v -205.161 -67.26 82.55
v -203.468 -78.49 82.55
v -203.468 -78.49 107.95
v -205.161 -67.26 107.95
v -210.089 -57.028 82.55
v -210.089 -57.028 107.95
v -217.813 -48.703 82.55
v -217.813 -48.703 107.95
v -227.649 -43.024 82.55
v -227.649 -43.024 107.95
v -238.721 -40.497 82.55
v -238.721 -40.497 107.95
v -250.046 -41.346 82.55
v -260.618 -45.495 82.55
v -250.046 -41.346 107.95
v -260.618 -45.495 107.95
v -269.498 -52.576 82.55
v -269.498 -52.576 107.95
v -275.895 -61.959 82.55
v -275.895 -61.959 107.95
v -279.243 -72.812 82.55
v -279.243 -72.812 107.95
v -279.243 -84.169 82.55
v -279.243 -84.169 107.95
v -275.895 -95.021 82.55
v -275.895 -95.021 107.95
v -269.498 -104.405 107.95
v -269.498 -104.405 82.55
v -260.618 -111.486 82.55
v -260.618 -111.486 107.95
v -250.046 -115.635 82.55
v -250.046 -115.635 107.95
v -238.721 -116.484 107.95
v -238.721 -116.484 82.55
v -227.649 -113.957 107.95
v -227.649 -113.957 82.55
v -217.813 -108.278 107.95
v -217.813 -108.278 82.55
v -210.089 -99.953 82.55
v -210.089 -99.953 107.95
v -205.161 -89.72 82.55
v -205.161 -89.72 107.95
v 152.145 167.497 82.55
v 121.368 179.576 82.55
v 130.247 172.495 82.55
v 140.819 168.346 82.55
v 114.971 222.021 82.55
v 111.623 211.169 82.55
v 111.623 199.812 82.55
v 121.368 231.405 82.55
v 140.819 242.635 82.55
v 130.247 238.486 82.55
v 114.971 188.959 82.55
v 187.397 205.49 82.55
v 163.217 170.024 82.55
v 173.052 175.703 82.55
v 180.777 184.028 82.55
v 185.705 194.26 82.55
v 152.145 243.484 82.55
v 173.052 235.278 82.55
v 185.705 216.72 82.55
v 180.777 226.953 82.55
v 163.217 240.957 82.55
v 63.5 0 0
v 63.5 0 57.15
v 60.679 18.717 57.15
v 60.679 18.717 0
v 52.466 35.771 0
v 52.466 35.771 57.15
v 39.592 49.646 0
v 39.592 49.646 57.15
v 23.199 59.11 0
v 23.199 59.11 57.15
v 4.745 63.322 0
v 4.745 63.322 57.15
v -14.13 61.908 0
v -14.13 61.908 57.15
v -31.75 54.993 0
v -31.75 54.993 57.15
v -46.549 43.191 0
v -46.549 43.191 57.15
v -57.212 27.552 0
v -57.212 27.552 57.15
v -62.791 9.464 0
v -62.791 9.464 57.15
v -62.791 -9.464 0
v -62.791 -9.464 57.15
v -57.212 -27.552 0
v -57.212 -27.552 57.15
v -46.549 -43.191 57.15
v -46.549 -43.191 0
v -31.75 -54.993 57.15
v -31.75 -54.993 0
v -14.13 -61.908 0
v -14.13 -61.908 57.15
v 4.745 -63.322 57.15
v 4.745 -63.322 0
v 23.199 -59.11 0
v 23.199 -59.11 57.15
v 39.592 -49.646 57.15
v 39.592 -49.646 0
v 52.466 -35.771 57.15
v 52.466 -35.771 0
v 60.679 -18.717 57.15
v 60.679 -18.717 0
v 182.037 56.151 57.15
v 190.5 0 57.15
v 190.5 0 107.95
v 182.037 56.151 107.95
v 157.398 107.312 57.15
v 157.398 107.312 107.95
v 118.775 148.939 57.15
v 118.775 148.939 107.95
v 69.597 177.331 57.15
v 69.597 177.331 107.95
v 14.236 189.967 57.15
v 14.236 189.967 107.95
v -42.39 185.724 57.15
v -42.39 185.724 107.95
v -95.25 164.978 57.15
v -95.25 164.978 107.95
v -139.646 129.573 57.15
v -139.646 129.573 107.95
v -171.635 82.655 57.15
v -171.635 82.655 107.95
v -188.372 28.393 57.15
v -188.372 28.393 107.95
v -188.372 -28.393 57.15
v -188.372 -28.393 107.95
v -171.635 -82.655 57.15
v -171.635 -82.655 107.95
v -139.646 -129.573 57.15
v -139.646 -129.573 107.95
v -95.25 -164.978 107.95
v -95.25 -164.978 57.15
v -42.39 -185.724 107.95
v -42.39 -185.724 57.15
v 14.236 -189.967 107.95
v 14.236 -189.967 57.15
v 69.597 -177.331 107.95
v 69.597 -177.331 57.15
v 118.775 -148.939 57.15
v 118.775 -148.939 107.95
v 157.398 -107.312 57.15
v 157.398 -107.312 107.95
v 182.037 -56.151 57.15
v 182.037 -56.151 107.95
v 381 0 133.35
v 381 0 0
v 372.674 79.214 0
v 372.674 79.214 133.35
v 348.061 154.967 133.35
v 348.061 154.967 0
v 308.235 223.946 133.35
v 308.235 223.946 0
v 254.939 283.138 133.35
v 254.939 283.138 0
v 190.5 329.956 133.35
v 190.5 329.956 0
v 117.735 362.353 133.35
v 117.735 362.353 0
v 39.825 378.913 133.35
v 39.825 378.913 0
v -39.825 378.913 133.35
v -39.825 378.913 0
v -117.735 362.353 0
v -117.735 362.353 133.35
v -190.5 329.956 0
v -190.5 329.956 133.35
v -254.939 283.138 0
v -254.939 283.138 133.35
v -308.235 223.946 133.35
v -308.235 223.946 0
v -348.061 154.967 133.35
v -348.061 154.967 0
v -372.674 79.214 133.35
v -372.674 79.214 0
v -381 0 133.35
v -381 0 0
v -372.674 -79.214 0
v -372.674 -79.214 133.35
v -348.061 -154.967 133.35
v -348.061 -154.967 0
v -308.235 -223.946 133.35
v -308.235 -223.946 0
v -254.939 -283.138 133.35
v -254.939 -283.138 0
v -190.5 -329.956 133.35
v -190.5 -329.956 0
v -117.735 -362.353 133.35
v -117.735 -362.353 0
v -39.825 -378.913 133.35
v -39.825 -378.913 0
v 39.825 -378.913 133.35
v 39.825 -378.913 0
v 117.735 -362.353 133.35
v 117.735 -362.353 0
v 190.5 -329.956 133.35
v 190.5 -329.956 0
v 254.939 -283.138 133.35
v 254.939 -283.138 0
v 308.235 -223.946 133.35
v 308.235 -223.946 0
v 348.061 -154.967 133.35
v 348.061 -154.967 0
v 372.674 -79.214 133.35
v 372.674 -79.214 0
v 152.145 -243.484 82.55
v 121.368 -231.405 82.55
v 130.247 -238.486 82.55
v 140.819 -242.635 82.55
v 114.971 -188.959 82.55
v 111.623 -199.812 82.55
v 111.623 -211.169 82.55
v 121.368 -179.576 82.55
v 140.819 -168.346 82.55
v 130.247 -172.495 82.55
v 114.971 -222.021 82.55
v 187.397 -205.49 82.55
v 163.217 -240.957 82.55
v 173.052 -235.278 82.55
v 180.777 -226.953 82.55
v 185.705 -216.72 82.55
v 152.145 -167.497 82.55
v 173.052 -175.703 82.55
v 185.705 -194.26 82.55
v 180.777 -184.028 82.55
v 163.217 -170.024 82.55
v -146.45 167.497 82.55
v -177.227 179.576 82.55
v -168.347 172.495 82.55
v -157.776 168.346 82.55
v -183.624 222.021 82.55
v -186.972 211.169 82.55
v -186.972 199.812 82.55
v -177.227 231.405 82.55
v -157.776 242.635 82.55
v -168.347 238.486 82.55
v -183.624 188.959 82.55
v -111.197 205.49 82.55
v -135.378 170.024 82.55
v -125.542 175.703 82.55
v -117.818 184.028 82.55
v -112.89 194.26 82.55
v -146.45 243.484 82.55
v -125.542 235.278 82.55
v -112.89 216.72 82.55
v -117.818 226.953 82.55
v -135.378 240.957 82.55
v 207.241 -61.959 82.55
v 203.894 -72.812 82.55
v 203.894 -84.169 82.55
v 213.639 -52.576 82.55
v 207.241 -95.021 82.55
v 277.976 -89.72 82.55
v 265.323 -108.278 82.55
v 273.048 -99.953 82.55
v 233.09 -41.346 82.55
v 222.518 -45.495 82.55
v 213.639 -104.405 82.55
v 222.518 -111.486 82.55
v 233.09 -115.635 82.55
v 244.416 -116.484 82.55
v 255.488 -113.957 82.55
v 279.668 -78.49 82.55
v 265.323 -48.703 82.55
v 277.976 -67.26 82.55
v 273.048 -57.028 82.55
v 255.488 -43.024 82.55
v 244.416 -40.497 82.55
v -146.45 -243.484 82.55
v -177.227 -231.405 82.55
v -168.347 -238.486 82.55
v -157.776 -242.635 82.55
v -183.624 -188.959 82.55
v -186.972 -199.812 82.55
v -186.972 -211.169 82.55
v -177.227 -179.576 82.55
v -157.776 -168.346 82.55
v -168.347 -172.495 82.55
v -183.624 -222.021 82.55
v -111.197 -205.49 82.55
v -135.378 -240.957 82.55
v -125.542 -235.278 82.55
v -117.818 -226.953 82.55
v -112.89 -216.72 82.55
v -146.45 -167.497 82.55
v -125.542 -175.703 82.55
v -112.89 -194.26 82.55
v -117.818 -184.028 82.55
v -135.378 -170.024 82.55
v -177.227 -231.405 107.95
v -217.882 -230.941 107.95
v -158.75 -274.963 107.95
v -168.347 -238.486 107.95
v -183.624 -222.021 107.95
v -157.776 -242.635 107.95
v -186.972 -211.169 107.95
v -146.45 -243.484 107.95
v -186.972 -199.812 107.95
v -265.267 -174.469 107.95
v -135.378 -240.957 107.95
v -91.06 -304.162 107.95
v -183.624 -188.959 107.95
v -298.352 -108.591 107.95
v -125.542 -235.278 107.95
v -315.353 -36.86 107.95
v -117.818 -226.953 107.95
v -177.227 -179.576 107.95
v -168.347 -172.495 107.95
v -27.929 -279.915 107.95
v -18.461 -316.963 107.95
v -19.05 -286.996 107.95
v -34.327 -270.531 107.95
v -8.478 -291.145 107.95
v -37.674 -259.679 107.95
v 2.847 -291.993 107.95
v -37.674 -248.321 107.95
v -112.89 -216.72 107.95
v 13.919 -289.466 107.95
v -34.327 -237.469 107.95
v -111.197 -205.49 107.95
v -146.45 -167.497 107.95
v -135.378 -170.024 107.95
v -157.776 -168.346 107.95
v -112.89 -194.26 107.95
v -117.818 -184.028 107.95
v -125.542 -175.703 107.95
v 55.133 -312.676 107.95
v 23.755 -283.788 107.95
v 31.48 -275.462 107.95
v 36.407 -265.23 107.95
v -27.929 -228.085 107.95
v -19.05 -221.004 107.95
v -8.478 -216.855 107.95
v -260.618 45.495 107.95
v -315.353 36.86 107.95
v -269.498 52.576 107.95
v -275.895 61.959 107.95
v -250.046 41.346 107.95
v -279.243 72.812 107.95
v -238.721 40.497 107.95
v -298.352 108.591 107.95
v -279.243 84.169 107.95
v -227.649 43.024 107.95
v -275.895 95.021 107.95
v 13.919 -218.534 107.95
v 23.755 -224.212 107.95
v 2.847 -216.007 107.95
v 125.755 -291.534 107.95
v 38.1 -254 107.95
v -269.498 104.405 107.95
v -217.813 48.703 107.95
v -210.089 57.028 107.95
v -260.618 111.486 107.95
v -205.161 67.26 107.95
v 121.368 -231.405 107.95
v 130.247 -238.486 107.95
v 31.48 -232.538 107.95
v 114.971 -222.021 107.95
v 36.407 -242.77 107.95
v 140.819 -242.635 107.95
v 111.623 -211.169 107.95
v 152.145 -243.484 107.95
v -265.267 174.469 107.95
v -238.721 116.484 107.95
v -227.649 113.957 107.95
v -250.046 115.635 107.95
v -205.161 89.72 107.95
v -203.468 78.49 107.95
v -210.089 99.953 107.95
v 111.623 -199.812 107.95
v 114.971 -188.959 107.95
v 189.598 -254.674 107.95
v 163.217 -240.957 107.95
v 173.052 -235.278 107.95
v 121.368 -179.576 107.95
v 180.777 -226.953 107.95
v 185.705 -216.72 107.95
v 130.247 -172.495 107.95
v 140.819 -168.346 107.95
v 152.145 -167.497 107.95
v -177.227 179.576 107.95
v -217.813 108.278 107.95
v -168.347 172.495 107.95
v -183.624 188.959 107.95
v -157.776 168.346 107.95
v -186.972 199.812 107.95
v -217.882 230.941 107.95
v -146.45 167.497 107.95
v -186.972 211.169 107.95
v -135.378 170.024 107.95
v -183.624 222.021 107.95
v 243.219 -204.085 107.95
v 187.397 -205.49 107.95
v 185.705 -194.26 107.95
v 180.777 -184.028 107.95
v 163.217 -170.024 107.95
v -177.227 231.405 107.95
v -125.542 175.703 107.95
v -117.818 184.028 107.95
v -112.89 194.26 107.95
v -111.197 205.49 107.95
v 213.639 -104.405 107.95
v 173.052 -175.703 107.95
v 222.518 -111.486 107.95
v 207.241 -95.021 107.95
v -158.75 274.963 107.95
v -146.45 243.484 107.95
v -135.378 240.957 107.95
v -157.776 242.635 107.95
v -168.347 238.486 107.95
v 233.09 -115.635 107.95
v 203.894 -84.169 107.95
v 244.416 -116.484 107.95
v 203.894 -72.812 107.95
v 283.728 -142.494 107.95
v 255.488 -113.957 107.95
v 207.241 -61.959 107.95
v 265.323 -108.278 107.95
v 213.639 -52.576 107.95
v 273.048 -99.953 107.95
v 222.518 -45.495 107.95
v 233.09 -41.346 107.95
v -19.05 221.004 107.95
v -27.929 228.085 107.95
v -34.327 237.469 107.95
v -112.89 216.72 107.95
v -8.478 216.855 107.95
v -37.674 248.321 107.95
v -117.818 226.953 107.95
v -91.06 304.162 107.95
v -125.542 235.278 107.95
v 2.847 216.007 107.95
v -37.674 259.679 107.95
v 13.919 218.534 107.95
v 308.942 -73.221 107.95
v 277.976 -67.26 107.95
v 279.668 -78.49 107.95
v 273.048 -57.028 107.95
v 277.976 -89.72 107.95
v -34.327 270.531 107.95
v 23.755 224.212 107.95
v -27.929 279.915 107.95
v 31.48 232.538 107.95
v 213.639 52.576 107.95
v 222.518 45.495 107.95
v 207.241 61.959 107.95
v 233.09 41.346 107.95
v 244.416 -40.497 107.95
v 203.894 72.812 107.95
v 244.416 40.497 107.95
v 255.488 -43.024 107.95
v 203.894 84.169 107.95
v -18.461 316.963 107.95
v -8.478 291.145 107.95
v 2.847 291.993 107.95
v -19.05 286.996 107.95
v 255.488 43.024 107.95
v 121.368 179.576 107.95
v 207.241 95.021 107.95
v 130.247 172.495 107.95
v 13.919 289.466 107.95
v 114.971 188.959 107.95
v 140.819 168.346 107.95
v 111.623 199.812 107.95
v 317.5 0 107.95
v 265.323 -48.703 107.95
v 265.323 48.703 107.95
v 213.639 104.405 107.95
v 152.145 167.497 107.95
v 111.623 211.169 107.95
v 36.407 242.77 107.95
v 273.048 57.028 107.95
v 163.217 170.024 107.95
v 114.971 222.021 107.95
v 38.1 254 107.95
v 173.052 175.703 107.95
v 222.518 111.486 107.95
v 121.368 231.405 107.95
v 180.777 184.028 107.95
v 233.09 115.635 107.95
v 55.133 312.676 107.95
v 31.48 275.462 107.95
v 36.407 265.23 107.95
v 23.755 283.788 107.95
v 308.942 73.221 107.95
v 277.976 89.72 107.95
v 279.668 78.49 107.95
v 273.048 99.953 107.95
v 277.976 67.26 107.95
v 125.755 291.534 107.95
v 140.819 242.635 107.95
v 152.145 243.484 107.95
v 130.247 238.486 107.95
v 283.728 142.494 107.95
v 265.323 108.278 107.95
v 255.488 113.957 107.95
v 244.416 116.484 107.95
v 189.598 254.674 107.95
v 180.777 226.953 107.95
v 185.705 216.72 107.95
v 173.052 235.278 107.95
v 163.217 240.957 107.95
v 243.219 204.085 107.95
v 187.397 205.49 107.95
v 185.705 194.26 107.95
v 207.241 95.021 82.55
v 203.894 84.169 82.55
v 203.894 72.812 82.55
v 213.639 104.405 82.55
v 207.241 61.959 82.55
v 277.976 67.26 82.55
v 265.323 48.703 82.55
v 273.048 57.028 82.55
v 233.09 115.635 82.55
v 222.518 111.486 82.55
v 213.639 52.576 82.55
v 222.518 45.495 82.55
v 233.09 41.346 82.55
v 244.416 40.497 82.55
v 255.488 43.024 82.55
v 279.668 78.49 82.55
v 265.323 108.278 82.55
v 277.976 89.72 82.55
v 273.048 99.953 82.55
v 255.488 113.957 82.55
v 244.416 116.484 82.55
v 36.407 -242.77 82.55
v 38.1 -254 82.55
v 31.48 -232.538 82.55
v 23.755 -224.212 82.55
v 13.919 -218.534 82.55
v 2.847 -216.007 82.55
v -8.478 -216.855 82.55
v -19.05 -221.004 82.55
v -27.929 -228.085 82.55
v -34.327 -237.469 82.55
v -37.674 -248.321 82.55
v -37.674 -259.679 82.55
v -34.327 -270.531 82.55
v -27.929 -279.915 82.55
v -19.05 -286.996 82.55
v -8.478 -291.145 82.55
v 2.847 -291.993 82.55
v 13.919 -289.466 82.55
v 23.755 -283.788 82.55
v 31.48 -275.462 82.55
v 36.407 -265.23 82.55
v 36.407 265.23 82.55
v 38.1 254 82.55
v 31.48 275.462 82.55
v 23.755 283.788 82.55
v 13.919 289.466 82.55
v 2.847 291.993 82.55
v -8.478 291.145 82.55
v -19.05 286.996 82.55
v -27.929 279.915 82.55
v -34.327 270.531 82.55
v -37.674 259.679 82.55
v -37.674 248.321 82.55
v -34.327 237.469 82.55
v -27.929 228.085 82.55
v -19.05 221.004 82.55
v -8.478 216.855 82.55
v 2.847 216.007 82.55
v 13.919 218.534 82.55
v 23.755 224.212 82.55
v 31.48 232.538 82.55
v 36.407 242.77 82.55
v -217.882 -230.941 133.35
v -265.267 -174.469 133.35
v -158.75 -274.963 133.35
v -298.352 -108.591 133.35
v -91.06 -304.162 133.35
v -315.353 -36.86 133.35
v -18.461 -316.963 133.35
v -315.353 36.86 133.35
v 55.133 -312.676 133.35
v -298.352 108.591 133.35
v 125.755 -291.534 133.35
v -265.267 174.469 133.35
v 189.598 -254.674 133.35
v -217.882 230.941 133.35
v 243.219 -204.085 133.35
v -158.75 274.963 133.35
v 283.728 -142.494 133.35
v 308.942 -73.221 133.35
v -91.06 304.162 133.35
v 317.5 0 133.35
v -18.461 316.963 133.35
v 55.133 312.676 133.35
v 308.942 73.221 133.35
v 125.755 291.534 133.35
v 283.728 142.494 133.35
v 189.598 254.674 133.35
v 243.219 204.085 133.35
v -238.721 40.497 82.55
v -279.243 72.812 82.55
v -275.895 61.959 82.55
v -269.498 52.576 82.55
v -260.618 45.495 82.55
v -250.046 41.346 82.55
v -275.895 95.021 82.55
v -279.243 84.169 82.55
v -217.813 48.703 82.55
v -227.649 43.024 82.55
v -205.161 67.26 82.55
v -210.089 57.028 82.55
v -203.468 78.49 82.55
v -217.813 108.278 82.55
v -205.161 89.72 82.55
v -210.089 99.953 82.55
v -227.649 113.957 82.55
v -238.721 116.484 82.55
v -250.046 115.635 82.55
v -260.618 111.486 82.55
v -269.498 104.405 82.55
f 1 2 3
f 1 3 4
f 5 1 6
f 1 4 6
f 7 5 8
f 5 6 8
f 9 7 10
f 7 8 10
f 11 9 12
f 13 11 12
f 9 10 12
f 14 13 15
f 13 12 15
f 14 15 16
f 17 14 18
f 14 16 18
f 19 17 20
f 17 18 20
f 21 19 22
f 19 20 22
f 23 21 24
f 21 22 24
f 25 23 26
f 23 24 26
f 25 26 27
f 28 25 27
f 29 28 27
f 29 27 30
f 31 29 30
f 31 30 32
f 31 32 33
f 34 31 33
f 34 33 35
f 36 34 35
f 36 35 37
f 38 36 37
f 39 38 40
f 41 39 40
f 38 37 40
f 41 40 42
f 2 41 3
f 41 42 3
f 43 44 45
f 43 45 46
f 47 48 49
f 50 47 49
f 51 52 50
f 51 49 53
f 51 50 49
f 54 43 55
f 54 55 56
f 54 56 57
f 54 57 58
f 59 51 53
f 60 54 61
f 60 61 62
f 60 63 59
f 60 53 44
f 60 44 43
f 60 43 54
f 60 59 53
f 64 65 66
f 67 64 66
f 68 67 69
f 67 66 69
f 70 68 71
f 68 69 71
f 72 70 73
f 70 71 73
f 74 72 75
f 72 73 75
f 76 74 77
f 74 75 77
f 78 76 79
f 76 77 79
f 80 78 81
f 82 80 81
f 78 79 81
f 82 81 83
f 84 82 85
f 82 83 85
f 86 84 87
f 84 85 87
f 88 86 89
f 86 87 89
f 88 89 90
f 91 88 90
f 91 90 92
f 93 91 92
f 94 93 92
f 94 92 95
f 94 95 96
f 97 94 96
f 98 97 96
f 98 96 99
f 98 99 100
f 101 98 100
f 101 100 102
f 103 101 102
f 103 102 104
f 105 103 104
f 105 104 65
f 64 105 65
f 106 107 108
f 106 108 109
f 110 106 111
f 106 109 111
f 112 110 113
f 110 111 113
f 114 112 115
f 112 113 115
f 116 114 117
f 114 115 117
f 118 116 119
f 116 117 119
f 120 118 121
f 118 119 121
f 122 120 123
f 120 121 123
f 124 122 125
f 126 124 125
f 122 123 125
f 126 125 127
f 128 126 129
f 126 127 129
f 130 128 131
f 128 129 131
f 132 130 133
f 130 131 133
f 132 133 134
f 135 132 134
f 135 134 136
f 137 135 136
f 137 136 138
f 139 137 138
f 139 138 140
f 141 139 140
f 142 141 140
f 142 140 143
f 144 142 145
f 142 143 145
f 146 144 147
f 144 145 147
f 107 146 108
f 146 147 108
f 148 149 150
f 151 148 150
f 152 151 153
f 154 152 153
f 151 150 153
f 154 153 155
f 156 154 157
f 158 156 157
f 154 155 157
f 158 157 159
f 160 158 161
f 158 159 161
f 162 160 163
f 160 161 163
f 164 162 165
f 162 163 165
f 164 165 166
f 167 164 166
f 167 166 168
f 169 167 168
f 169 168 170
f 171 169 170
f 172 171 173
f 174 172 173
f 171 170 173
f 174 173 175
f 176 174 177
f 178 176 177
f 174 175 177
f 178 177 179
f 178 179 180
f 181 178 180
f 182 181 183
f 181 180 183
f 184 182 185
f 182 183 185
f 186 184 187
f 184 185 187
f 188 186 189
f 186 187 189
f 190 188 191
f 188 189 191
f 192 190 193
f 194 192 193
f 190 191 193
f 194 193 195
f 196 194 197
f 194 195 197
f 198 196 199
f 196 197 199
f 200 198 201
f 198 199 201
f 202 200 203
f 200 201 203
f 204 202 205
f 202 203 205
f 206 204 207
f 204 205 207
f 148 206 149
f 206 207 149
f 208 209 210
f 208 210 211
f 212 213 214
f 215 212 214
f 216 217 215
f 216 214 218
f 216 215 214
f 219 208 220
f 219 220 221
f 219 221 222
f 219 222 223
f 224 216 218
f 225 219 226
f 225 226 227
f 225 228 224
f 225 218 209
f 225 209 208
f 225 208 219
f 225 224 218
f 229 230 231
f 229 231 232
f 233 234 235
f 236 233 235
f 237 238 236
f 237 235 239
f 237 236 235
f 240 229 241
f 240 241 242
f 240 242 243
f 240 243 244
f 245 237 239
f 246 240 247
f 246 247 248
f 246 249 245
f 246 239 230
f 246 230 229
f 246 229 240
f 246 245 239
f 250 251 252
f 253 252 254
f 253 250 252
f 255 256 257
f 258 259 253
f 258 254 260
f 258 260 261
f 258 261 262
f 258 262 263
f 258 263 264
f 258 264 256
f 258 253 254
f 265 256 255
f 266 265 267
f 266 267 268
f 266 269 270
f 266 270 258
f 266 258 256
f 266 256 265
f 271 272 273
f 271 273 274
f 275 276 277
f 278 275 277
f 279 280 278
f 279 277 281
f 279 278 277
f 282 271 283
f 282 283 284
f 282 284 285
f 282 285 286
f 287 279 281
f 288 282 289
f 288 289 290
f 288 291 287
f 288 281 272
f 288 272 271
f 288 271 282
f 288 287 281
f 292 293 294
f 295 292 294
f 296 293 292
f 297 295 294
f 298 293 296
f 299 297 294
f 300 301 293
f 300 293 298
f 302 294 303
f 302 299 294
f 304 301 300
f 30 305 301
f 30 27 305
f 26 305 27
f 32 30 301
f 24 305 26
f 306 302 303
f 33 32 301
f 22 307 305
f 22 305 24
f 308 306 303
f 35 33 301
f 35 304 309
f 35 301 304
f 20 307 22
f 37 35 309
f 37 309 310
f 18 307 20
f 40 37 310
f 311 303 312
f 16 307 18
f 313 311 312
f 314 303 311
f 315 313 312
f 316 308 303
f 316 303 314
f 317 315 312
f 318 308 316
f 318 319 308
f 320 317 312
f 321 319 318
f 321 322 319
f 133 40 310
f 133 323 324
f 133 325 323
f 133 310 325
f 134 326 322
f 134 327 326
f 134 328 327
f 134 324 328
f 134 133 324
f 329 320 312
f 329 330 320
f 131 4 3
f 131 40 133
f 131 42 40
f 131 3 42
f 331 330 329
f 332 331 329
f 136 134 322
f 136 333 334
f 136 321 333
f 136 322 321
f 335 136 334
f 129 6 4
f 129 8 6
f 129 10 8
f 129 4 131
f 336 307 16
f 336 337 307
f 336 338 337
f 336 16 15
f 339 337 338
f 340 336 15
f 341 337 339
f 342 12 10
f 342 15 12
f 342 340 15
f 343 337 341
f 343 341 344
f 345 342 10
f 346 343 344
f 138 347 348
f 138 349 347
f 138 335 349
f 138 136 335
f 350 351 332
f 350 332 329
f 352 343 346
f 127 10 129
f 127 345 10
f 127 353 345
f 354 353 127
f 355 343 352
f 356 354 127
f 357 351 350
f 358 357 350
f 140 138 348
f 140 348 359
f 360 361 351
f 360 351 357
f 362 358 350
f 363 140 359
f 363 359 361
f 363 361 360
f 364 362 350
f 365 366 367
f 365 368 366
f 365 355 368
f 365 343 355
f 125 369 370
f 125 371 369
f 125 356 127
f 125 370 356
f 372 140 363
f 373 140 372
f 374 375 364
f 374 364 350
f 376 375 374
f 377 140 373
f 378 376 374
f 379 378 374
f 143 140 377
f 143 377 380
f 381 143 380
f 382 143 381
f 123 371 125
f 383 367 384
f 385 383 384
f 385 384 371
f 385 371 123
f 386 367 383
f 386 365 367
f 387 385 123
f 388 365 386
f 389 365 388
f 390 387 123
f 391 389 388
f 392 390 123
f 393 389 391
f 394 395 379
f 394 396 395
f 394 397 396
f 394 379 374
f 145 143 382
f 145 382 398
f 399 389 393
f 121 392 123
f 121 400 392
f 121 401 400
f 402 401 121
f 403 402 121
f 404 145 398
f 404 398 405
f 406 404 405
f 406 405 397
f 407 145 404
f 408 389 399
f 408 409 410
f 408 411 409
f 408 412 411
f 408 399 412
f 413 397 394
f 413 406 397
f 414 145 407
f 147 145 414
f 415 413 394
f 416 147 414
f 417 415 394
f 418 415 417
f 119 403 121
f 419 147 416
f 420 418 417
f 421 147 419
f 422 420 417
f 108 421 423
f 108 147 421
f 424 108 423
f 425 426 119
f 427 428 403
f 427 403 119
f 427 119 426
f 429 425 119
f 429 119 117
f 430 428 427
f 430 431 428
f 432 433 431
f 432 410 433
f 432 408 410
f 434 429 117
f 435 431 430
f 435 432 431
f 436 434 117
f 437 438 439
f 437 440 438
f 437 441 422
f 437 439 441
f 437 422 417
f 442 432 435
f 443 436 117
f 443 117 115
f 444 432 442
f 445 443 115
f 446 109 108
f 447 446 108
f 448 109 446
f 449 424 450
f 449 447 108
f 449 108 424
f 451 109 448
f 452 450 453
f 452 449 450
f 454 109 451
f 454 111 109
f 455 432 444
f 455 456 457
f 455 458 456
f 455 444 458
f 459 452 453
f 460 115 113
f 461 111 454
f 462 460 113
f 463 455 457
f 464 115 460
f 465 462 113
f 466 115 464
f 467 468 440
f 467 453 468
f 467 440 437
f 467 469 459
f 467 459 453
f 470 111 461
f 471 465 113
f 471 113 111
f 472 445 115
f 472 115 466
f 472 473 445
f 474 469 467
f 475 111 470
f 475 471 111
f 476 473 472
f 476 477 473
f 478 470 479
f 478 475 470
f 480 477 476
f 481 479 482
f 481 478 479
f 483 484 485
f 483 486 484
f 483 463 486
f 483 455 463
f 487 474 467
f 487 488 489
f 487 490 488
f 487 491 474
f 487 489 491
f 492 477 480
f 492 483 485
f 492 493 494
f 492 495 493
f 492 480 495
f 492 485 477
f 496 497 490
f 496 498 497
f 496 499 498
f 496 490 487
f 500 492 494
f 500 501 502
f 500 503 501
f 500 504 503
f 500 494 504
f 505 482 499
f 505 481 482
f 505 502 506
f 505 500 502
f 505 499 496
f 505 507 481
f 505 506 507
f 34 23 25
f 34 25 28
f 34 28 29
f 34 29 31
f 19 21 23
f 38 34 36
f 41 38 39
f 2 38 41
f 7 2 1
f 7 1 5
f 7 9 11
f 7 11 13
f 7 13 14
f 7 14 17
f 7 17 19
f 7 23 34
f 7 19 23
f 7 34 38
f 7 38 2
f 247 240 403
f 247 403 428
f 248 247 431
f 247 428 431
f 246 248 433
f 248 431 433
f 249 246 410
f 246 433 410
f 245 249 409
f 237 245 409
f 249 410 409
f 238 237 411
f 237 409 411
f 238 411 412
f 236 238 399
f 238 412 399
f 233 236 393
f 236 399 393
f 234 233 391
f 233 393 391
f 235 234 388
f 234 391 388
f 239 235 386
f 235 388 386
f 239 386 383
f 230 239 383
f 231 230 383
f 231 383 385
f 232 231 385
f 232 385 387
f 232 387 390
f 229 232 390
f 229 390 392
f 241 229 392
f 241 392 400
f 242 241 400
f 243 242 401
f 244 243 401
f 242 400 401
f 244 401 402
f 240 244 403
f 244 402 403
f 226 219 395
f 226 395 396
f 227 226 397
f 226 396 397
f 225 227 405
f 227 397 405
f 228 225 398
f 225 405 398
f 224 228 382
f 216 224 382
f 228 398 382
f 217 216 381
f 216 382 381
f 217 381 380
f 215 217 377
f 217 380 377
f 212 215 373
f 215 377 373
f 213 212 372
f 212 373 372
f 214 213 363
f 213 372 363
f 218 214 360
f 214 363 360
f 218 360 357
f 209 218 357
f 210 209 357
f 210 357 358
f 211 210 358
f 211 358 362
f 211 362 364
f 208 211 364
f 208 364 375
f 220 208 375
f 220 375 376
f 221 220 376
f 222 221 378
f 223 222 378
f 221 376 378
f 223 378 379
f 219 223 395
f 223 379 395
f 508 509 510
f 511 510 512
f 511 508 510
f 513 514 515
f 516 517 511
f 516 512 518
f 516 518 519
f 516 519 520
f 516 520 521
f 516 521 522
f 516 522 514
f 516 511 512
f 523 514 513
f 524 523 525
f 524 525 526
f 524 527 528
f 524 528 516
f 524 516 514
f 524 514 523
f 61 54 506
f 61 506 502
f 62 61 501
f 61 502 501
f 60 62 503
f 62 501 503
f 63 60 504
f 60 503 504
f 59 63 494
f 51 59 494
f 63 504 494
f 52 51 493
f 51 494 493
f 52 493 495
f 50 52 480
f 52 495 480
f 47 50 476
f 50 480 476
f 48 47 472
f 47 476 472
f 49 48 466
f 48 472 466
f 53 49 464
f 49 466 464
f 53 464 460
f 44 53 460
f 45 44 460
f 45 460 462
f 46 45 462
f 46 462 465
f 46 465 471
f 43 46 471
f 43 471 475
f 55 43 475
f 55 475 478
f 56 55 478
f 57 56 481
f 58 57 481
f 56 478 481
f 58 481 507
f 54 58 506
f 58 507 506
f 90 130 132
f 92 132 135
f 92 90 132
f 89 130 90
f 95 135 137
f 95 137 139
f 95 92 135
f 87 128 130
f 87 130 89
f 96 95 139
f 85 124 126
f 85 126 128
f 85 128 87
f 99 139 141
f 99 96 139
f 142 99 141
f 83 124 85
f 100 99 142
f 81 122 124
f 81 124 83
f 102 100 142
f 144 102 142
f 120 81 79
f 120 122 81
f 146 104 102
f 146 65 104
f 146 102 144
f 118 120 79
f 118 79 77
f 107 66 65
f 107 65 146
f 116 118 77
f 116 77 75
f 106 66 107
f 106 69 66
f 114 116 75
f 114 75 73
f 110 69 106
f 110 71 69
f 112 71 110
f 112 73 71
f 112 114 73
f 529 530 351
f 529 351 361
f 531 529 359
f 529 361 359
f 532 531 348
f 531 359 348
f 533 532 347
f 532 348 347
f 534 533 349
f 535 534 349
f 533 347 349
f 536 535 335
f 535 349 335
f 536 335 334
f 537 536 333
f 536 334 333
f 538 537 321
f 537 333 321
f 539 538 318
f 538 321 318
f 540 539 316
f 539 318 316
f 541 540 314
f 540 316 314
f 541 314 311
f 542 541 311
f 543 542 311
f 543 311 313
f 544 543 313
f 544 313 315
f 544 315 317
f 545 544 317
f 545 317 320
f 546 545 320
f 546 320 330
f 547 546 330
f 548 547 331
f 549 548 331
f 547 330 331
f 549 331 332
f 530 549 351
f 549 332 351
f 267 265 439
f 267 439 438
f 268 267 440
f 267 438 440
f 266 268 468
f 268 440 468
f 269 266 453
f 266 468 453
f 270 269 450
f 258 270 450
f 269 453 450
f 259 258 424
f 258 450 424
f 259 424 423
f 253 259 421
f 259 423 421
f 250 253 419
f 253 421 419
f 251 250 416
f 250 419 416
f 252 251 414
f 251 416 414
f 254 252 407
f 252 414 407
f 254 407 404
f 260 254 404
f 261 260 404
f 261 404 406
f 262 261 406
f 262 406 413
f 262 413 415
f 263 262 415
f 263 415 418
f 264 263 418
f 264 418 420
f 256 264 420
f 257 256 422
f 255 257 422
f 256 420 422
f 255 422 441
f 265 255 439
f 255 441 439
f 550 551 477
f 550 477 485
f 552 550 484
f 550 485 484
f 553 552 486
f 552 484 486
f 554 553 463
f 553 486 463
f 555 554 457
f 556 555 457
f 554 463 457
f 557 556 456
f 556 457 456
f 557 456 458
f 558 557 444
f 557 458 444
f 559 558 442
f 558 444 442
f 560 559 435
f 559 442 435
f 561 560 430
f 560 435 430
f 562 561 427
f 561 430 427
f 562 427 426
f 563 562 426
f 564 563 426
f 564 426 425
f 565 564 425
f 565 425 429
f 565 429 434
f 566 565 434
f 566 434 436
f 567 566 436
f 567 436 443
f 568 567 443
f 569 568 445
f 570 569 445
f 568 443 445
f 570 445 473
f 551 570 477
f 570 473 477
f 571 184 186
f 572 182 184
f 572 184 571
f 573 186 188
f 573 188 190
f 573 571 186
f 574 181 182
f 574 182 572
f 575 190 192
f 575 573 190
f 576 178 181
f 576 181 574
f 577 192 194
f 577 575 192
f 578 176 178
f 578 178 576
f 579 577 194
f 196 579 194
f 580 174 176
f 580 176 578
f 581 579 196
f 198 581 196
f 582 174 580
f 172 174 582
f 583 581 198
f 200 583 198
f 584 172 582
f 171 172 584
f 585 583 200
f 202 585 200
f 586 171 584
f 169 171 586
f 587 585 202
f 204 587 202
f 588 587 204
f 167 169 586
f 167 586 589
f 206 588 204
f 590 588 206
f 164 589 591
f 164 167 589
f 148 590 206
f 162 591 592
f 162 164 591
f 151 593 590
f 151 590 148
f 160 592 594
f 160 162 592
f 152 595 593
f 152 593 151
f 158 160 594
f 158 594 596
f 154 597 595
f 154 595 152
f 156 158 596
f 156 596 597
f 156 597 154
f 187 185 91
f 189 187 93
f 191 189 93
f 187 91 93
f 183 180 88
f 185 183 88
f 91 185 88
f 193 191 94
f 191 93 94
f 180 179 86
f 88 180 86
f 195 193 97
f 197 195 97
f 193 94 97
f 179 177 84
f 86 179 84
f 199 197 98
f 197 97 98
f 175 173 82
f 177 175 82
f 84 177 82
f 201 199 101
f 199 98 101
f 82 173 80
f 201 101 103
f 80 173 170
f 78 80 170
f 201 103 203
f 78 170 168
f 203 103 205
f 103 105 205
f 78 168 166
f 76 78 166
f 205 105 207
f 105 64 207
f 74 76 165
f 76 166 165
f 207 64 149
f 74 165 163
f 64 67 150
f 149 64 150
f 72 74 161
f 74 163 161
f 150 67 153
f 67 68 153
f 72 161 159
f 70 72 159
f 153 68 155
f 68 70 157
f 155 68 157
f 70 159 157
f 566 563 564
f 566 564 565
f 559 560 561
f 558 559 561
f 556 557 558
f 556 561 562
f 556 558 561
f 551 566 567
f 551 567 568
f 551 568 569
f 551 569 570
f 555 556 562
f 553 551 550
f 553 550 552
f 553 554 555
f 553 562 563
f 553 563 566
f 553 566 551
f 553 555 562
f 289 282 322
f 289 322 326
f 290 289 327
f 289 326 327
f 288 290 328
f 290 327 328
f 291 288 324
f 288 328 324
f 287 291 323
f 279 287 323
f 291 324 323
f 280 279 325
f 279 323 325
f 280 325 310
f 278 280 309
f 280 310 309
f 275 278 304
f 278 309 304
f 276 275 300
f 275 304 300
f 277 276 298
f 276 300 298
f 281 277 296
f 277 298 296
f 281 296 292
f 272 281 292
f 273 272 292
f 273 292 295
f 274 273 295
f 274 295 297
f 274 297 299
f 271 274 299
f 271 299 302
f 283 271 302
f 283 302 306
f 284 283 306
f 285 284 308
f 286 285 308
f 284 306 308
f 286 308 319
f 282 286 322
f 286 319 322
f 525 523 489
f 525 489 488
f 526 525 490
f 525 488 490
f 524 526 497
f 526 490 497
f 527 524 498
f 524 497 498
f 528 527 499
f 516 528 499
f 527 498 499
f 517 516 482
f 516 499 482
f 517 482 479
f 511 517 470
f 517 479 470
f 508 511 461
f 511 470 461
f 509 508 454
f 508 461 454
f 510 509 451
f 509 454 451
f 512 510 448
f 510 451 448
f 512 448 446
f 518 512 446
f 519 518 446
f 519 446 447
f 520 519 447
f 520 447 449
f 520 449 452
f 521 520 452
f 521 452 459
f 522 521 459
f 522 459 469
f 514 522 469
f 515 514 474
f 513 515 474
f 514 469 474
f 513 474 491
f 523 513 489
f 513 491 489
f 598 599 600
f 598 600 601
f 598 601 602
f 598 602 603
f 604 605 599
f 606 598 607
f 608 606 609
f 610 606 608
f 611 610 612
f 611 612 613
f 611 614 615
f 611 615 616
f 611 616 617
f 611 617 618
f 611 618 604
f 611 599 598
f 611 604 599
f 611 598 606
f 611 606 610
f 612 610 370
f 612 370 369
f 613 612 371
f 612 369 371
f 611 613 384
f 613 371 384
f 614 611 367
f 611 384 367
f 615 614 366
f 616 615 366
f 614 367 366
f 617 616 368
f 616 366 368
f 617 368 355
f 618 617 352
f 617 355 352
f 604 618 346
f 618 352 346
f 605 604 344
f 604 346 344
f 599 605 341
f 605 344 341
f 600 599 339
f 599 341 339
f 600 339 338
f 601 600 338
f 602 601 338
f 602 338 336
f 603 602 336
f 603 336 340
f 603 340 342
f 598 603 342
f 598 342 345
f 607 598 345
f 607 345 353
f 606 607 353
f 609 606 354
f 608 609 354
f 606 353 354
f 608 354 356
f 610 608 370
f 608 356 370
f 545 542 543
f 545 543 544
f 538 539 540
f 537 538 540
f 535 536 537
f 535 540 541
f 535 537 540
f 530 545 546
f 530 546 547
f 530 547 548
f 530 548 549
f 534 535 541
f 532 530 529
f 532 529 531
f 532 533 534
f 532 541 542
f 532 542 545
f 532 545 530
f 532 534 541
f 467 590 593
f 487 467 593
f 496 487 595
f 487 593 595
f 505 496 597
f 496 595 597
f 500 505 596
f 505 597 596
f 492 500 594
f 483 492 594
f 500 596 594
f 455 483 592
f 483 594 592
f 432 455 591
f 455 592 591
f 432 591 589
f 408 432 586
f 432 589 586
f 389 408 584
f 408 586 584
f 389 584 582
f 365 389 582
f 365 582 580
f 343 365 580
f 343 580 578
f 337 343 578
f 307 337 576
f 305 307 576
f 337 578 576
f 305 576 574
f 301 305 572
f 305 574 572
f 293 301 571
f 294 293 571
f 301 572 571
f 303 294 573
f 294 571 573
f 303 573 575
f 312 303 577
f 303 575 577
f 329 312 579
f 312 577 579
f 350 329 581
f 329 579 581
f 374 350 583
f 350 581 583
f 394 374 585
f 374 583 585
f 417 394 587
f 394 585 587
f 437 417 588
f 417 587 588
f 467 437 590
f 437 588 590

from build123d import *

# Parameters (mm, degrees)
SKETCH2_R           = 381
BOSS_EXTRUDE1_DEPTH = 133.35
SKETCH3_R           = 317.5
CUT_EXTRUDE1_DEPTH  = 25.4
SKETCH4_R           = 38.1
CUT_EXTRUDE2_DEPTH  = 25.4
SKETCH5_R           = 190.5
CUT_EXTRUDE3_DEPTH  = 50.8
SKETCH6_R           = 63.5
CUT_EXTRUDE4_DEPTH  = 545.176846255


with BuildPart() as part:
    # Sketch2 → Boss-Extrude1 (new body)
    with BuildSketch(Plane.XY):
        Circle(SKETCH2_R)
    extrude(amount=BOSS_EXTRUDE1_DEPTH)

    # Sketch3 → Cut-Extrude1 (cut)
    with BuildSketch(Plane.XY.offset(133.35)):
        Circle(SKETCH3_R)
    extrude(amount=-CUT_EXTRUDE1_DEPTH, mode=Mode.SUBTRACT)

    # Sketch4 → Cut-Extrude2 (cut)
    with BuildSketch(Plane.XY.offset(107.95)):
        with Locations((0, 254)):
            Circle(SKETCH4_R)
        with Locations((149.297454082, 205.490316571)):
            Circle(SKETCH4_R)
        with Locations((241.568355139, 78.490316571)):
            Circle(SKETCH4_R)
        with Locations((241.568355139, -78.490316571)):
            Circle(SKETCH4_R)
        with Locations((149.297454082, -205.490316571)):
            Circle(SKETCH4_R)
        with Locations((0, -254)):
            Circle(SKETCH4_R)
        with Locations((-149.297454082, -205.490316571)):
            Circle(SKETCH4_R)
        with Locations((-241.568355139, -78.490316571)):
            Circle(SKETCH4_R)
        with Locations((-241.568355139, 78.490316571)):
            Circle(SKETCH4_R)
        with Locations((-149.297454082, 205.490316571)):
            Circle(SKETCH4_R)
    extrude(amount=-CUT_EXTRUDE2_DEPTH, mode=Mode.SUBTRACT)

    # Sketch5 → Cut-Extrude3 (cut)
    with BuildSketch(Plane.XY.offset(107.95)):
        Circle(SKETCH5_R)
    extrude(amount=-CUT_EXTRUDE3_DEPTH, mode=Mode.SUBTRACT)

    # Sketch6 → Cut-Extrude4 (cut, through all)
    with BuildSketch(Plane.XY.offset(57.15)):
        Circle(SKETCH6_R)
    extrude(amount=-CUT_EXTRUDE4_DEPTH, mode=Mode.SUBTRACT)


solid = part.part
